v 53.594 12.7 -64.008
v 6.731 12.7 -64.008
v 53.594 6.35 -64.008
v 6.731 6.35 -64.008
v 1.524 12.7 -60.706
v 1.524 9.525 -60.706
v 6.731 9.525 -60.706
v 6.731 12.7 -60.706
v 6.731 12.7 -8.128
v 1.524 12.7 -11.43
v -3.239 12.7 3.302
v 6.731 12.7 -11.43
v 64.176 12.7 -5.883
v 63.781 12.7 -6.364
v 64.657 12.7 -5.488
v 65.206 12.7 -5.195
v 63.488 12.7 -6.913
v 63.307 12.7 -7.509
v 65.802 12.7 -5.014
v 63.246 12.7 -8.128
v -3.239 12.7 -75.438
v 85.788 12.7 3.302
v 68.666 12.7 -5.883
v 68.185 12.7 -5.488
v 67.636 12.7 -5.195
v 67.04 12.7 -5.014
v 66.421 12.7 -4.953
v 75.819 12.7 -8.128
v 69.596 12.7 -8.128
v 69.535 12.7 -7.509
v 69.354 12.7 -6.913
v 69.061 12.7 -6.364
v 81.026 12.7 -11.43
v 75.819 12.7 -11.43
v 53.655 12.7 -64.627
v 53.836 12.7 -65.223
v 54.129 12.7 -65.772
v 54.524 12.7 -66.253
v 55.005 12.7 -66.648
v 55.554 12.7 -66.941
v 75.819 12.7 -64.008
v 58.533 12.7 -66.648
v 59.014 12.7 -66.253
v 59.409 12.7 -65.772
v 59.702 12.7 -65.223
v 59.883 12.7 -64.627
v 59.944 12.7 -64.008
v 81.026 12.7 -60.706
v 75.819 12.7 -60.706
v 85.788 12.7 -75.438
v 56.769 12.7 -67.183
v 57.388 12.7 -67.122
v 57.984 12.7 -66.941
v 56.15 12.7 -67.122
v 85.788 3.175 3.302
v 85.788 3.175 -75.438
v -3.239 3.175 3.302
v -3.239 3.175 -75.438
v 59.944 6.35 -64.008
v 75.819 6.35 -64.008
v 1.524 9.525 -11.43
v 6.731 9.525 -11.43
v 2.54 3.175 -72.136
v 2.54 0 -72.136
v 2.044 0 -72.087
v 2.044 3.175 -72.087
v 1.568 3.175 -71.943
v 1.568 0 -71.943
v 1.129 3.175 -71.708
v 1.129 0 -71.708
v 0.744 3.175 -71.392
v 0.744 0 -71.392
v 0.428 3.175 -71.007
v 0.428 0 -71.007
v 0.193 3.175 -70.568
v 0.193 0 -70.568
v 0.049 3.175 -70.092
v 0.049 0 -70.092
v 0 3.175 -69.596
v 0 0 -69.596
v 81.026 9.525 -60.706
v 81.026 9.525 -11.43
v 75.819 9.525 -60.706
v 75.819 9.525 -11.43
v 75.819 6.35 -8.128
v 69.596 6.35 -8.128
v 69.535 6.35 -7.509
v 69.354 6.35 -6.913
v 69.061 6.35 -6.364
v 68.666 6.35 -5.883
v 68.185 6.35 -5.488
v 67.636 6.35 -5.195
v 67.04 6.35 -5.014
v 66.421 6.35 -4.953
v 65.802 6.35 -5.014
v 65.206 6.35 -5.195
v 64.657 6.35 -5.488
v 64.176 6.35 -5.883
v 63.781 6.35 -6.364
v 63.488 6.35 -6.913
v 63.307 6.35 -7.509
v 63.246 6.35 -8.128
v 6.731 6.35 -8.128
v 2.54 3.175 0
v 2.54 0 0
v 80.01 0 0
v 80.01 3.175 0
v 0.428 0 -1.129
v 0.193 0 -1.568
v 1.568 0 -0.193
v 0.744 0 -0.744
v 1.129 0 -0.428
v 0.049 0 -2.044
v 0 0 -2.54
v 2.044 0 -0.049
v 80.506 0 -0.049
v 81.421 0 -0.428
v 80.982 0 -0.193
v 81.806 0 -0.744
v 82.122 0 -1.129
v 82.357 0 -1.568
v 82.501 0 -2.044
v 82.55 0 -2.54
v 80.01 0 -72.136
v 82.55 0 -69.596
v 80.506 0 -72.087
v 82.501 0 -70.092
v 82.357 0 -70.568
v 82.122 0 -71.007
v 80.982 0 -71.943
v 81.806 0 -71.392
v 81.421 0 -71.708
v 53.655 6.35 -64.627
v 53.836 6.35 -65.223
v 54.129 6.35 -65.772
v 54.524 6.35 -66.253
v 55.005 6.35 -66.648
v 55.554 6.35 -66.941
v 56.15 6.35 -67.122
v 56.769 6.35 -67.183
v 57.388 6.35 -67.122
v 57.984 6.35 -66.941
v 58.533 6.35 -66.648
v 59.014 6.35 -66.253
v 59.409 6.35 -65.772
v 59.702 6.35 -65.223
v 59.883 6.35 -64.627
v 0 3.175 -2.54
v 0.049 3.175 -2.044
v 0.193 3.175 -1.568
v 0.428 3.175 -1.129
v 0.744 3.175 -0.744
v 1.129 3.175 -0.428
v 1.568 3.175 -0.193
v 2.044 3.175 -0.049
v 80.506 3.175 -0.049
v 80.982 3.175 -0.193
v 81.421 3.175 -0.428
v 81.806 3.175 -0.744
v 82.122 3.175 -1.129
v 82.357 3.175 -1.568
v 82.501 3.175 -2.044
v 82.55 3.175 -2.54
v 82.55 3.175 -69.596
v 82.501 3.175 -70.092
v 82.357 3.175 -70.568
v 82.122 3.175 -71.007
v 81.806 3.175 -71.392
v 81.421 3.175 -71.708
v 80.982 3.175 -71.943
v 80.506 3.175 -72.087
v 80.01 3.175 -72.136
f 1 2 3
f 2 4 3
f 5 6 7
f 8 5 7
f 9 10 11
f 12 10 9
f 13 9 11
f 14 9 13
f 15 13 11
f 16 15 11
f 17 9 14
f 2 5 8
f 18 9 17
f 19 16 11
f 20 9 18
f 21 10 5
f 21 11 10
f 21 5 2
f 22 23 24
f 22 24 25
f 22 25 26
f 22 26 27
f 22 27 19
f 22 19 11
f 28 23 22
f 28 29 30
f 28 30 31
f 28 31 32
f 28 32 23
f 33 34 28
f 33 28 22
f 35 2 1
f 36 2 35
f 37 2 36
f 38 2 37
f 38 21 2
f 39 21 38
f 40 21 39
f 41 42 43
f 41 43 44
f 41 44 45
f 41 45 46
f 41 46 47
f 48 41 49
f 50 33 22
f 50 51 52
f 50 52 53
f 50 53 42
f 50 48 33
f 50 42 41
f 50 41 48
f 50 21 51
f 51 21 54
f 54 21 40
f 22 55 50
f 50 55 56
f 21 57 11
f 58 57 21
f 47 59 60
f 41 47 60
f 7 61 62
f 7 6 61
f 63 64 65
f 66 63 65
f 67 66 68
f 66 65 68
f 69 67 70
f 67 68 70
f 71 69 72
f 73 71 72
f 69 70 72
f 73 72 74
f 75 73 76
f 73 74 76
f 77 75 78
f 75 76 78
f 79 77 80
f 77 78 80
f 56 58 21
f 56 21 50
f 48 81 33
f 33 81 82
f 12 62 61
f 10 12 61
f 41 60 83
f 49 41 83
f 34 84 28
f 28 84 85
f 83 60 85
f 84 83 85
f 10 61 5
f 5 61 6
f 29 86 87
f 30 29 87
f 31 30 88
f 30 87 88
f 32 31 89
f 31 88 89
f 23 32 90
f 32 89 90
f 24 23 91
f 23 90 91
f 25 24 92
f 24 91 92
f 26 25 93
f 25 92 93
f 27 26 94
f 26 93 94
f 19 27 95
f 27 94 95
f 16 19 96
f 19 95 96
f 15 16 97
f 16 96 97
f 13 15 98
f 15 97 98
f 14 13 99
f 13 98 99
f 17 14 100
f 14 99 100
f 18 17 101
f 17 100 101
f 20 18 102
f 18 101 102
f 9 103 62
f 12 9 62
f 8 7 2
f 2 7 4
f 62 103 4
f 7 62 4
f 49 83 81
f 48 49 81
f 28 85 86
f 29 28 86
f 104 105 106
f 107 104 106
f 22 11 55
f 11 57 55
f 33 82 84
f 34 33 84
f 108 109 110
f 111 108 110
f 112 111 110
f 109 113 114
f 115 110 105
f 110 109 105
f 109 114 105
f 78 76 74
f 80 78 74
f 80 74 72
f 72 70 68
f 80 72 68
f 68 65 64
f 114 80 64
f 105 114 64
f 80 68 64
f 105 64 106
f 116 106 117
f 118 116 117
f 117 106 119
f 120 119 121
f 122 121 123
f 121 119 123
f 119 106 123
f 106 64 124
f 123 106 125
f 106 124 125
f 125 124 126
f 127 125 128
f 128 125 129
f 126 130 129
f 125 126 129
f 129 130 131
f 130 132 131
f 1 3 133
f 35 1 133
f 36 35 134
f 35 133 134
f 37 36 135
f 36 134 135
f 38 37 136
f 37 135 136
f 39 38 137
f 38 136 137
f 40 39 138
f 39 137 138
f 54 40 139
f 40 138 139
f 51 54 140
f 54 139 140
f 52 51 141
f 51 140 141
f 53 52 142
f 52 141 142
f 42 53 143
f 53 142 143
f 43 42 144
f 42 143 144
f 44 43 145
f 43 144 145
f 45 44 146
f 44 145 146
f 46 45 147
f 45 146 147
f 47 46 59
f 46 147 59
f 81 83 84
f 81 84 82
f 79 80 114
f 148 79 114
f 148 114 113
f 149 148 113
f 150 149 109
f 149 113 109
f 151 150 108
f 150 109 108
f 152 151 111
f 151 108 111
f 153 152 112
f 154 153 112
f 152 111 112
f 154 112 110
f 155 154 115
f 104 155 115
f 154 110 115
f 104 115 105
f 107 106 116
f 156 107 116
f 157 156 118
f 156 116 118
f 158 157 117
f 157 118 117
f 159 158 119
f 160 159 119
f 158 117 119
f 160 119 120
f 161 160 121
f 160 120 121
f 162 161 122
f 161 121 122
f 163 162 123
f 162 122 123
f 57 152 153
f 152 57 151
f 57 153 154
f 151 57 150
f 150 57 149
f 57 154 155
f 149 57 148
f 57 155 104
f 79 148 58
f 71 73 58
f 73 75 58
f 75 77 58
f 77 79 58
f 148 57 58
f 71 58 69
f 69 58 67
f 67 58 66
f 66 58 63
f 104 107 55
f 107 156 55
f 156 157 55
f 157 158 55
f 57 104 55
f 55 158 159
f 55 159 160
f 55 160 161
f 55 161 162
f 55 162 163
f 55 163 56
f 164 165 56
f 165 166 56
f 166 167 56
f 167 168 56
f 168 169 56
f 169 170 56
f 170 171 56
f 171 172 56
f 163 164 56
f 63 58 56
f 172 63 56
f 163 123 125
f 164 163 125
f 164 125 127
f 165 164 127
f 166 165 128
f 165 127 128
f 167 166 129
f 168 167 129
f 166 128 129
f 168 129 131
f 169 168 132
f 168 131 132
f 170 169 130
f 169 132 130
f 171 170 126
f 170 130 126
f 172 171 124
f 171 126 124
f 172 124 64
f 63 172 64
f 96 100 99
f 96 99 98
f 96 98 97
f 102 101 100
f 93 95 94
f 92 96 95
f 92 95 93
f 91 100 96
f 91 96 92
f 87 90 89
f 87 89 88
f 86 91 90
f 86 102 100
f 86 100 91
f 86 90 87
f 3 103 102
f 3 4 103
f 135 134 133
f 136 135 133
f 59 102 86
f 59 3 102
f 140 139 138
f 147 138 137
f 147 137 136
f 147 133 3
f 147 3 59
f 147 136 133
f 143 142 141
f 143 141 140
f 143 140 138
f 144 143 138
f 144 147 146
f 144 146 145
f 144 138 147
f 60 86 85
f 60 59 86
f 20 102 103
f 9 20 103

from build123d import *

# Parameters (mm, degrees)
BOSS_EXTRUDE1_DEPTH = 3.175
SKETCH2_W           = 89.027
SKETCH2_H           = 78.74
BOSS_EXTRUDE2_DEPTH = 6.35
CUT_EXTRUDE1_DEPTH  = 3.175
SKETCH4_W           = 89.027
SKETCH4_H           = 78.74
BOSS_EXTRUDE3_DEPTH = 3.175


with BuildPart() as part:
    # Sketch1 → Boss-Extrude1 (new body)
    with BuildSketch(Plane(origin=(0, 0, 0), x_dir=(1, 0, 0), z_dir=(0, 1, 0))):
        with BuildLine():
            Line((2.54, 0), (80.01, 0))
            ThreePointArc((80.01, 0), (81.806051224, 0.743948776), (82.55, 2.54))
            Line((82.55, 2.54), (82.55, 69.596))
            ThreePointArc((82.55, 69.596), (81.806051224, 71.392051224), (80.01, 72.136))
            Line((80.01, 72.136), (2.54, 72.136))
            ThreePointArc((2.54, 72.136), (0.743948776, 71.392051224), (0, 69.596))
            Line((0, 69.596), (0, 2.54))
            ThreePointArc((0, 2.54), (0.743948776, 0.743948776), (2.54, 0))
        make_face()
    extrude(amount=BOSS_EXTRUDE1_DEPTH)

    # Sketch2 → Boss-Extrude2 (add)
    with BuildSketch(Plane(origin=(0, 3.175, 0), x_dir=(1, 0, 0), z_dir=(0, 1, 0))):
        with Locations((41.275, 36.068)):
            Rectangle(SKETCH2_W, SKETCH2_H)
    extrude(amount=BOSS_EXTRUDE2_DEPTH)

    # Sketch3 → Cut-Extrude1 (cut)
    with BuildSketch(Plane(origin=(0, 9.525, 0), x_dir=(1, 0, 0), z_dir=(0, 1, 0))):
        with BuildLine():
            Line((6.731, 8.128), (63.246, 8.128))
            ThreePointArc((63.246, 8.128), (66.421, 4.953), (69.596, 8.128))
            Line((69.596, 8.128), (75.819, 8.128))
            Line((75.819, 8.128), (75.819, 64.008))
            Line((75.819, 64.008), (59.944, 64.008))
            ThreePointArc((59.944, 64.008), (56.769, 67.183), (53.594, 64.008))
            Line((53.594, 64.008), (6.731, 64.008))
            Line((6.731, 64.008), (6.731, 8.128))
        make_face()
    extrude(amount=-CUT_EXTRUDE1_DEPTH, mode=Mode.SUBTRACT)

    # Sketch4 → Boss-Extrude3 (add)
    with BuildSketch(Plane(origin=(0, 9.525, 0), x_dir=(1, 0, 0), z_dir=(0, 1, 0))):
        with Locations((41.275, 36.068)):
            Rectangle(SKETCH4_W, SKETCH4_H)
        with BuildLine():
            Line((6.731, 11.43), (1.524, 11.43))
            Line((1.524, 11.43), (1.524, 60.706))
            Line((1.524, 60.706), (6.731, 60.706))
            Line((6.731, 60.706), (6.731, 64.008))
            Line((6.731, 64.008), (53.594, 64.008))
            ThreePointArc((53.594, 64.008), (56.769, 67.183), (59.944, 64.008))
            Line((59.944, 64.008), (75.819, 64.008))
            Line((75.819, 64.008), (75.819, 60.706))
            Line((75.819, 60.706), (81.026, 60.706))
            Line((81.026, 60.706), (81.026, 11.43))
            Line((81.026, 11.43), (75.819, 11.43))
            Line((75.819, 11.43), (75.819, 8.128))
            Line((75.819, 8.128), (69.596, 8.128))
            ThreePointArc((69.596, 8.128), (66.421, 4.953), (63.246, 8.128))
            Line((63.246, 8.128), (6.731, 8.128))
            Line((6.731, 8.128), (6.731, 11.43))
        make_face(mode=Mode.SUBTRACT)
    extrude(amount=BOSS_EXTRUDE3_DEPTH)


solid = part.part
